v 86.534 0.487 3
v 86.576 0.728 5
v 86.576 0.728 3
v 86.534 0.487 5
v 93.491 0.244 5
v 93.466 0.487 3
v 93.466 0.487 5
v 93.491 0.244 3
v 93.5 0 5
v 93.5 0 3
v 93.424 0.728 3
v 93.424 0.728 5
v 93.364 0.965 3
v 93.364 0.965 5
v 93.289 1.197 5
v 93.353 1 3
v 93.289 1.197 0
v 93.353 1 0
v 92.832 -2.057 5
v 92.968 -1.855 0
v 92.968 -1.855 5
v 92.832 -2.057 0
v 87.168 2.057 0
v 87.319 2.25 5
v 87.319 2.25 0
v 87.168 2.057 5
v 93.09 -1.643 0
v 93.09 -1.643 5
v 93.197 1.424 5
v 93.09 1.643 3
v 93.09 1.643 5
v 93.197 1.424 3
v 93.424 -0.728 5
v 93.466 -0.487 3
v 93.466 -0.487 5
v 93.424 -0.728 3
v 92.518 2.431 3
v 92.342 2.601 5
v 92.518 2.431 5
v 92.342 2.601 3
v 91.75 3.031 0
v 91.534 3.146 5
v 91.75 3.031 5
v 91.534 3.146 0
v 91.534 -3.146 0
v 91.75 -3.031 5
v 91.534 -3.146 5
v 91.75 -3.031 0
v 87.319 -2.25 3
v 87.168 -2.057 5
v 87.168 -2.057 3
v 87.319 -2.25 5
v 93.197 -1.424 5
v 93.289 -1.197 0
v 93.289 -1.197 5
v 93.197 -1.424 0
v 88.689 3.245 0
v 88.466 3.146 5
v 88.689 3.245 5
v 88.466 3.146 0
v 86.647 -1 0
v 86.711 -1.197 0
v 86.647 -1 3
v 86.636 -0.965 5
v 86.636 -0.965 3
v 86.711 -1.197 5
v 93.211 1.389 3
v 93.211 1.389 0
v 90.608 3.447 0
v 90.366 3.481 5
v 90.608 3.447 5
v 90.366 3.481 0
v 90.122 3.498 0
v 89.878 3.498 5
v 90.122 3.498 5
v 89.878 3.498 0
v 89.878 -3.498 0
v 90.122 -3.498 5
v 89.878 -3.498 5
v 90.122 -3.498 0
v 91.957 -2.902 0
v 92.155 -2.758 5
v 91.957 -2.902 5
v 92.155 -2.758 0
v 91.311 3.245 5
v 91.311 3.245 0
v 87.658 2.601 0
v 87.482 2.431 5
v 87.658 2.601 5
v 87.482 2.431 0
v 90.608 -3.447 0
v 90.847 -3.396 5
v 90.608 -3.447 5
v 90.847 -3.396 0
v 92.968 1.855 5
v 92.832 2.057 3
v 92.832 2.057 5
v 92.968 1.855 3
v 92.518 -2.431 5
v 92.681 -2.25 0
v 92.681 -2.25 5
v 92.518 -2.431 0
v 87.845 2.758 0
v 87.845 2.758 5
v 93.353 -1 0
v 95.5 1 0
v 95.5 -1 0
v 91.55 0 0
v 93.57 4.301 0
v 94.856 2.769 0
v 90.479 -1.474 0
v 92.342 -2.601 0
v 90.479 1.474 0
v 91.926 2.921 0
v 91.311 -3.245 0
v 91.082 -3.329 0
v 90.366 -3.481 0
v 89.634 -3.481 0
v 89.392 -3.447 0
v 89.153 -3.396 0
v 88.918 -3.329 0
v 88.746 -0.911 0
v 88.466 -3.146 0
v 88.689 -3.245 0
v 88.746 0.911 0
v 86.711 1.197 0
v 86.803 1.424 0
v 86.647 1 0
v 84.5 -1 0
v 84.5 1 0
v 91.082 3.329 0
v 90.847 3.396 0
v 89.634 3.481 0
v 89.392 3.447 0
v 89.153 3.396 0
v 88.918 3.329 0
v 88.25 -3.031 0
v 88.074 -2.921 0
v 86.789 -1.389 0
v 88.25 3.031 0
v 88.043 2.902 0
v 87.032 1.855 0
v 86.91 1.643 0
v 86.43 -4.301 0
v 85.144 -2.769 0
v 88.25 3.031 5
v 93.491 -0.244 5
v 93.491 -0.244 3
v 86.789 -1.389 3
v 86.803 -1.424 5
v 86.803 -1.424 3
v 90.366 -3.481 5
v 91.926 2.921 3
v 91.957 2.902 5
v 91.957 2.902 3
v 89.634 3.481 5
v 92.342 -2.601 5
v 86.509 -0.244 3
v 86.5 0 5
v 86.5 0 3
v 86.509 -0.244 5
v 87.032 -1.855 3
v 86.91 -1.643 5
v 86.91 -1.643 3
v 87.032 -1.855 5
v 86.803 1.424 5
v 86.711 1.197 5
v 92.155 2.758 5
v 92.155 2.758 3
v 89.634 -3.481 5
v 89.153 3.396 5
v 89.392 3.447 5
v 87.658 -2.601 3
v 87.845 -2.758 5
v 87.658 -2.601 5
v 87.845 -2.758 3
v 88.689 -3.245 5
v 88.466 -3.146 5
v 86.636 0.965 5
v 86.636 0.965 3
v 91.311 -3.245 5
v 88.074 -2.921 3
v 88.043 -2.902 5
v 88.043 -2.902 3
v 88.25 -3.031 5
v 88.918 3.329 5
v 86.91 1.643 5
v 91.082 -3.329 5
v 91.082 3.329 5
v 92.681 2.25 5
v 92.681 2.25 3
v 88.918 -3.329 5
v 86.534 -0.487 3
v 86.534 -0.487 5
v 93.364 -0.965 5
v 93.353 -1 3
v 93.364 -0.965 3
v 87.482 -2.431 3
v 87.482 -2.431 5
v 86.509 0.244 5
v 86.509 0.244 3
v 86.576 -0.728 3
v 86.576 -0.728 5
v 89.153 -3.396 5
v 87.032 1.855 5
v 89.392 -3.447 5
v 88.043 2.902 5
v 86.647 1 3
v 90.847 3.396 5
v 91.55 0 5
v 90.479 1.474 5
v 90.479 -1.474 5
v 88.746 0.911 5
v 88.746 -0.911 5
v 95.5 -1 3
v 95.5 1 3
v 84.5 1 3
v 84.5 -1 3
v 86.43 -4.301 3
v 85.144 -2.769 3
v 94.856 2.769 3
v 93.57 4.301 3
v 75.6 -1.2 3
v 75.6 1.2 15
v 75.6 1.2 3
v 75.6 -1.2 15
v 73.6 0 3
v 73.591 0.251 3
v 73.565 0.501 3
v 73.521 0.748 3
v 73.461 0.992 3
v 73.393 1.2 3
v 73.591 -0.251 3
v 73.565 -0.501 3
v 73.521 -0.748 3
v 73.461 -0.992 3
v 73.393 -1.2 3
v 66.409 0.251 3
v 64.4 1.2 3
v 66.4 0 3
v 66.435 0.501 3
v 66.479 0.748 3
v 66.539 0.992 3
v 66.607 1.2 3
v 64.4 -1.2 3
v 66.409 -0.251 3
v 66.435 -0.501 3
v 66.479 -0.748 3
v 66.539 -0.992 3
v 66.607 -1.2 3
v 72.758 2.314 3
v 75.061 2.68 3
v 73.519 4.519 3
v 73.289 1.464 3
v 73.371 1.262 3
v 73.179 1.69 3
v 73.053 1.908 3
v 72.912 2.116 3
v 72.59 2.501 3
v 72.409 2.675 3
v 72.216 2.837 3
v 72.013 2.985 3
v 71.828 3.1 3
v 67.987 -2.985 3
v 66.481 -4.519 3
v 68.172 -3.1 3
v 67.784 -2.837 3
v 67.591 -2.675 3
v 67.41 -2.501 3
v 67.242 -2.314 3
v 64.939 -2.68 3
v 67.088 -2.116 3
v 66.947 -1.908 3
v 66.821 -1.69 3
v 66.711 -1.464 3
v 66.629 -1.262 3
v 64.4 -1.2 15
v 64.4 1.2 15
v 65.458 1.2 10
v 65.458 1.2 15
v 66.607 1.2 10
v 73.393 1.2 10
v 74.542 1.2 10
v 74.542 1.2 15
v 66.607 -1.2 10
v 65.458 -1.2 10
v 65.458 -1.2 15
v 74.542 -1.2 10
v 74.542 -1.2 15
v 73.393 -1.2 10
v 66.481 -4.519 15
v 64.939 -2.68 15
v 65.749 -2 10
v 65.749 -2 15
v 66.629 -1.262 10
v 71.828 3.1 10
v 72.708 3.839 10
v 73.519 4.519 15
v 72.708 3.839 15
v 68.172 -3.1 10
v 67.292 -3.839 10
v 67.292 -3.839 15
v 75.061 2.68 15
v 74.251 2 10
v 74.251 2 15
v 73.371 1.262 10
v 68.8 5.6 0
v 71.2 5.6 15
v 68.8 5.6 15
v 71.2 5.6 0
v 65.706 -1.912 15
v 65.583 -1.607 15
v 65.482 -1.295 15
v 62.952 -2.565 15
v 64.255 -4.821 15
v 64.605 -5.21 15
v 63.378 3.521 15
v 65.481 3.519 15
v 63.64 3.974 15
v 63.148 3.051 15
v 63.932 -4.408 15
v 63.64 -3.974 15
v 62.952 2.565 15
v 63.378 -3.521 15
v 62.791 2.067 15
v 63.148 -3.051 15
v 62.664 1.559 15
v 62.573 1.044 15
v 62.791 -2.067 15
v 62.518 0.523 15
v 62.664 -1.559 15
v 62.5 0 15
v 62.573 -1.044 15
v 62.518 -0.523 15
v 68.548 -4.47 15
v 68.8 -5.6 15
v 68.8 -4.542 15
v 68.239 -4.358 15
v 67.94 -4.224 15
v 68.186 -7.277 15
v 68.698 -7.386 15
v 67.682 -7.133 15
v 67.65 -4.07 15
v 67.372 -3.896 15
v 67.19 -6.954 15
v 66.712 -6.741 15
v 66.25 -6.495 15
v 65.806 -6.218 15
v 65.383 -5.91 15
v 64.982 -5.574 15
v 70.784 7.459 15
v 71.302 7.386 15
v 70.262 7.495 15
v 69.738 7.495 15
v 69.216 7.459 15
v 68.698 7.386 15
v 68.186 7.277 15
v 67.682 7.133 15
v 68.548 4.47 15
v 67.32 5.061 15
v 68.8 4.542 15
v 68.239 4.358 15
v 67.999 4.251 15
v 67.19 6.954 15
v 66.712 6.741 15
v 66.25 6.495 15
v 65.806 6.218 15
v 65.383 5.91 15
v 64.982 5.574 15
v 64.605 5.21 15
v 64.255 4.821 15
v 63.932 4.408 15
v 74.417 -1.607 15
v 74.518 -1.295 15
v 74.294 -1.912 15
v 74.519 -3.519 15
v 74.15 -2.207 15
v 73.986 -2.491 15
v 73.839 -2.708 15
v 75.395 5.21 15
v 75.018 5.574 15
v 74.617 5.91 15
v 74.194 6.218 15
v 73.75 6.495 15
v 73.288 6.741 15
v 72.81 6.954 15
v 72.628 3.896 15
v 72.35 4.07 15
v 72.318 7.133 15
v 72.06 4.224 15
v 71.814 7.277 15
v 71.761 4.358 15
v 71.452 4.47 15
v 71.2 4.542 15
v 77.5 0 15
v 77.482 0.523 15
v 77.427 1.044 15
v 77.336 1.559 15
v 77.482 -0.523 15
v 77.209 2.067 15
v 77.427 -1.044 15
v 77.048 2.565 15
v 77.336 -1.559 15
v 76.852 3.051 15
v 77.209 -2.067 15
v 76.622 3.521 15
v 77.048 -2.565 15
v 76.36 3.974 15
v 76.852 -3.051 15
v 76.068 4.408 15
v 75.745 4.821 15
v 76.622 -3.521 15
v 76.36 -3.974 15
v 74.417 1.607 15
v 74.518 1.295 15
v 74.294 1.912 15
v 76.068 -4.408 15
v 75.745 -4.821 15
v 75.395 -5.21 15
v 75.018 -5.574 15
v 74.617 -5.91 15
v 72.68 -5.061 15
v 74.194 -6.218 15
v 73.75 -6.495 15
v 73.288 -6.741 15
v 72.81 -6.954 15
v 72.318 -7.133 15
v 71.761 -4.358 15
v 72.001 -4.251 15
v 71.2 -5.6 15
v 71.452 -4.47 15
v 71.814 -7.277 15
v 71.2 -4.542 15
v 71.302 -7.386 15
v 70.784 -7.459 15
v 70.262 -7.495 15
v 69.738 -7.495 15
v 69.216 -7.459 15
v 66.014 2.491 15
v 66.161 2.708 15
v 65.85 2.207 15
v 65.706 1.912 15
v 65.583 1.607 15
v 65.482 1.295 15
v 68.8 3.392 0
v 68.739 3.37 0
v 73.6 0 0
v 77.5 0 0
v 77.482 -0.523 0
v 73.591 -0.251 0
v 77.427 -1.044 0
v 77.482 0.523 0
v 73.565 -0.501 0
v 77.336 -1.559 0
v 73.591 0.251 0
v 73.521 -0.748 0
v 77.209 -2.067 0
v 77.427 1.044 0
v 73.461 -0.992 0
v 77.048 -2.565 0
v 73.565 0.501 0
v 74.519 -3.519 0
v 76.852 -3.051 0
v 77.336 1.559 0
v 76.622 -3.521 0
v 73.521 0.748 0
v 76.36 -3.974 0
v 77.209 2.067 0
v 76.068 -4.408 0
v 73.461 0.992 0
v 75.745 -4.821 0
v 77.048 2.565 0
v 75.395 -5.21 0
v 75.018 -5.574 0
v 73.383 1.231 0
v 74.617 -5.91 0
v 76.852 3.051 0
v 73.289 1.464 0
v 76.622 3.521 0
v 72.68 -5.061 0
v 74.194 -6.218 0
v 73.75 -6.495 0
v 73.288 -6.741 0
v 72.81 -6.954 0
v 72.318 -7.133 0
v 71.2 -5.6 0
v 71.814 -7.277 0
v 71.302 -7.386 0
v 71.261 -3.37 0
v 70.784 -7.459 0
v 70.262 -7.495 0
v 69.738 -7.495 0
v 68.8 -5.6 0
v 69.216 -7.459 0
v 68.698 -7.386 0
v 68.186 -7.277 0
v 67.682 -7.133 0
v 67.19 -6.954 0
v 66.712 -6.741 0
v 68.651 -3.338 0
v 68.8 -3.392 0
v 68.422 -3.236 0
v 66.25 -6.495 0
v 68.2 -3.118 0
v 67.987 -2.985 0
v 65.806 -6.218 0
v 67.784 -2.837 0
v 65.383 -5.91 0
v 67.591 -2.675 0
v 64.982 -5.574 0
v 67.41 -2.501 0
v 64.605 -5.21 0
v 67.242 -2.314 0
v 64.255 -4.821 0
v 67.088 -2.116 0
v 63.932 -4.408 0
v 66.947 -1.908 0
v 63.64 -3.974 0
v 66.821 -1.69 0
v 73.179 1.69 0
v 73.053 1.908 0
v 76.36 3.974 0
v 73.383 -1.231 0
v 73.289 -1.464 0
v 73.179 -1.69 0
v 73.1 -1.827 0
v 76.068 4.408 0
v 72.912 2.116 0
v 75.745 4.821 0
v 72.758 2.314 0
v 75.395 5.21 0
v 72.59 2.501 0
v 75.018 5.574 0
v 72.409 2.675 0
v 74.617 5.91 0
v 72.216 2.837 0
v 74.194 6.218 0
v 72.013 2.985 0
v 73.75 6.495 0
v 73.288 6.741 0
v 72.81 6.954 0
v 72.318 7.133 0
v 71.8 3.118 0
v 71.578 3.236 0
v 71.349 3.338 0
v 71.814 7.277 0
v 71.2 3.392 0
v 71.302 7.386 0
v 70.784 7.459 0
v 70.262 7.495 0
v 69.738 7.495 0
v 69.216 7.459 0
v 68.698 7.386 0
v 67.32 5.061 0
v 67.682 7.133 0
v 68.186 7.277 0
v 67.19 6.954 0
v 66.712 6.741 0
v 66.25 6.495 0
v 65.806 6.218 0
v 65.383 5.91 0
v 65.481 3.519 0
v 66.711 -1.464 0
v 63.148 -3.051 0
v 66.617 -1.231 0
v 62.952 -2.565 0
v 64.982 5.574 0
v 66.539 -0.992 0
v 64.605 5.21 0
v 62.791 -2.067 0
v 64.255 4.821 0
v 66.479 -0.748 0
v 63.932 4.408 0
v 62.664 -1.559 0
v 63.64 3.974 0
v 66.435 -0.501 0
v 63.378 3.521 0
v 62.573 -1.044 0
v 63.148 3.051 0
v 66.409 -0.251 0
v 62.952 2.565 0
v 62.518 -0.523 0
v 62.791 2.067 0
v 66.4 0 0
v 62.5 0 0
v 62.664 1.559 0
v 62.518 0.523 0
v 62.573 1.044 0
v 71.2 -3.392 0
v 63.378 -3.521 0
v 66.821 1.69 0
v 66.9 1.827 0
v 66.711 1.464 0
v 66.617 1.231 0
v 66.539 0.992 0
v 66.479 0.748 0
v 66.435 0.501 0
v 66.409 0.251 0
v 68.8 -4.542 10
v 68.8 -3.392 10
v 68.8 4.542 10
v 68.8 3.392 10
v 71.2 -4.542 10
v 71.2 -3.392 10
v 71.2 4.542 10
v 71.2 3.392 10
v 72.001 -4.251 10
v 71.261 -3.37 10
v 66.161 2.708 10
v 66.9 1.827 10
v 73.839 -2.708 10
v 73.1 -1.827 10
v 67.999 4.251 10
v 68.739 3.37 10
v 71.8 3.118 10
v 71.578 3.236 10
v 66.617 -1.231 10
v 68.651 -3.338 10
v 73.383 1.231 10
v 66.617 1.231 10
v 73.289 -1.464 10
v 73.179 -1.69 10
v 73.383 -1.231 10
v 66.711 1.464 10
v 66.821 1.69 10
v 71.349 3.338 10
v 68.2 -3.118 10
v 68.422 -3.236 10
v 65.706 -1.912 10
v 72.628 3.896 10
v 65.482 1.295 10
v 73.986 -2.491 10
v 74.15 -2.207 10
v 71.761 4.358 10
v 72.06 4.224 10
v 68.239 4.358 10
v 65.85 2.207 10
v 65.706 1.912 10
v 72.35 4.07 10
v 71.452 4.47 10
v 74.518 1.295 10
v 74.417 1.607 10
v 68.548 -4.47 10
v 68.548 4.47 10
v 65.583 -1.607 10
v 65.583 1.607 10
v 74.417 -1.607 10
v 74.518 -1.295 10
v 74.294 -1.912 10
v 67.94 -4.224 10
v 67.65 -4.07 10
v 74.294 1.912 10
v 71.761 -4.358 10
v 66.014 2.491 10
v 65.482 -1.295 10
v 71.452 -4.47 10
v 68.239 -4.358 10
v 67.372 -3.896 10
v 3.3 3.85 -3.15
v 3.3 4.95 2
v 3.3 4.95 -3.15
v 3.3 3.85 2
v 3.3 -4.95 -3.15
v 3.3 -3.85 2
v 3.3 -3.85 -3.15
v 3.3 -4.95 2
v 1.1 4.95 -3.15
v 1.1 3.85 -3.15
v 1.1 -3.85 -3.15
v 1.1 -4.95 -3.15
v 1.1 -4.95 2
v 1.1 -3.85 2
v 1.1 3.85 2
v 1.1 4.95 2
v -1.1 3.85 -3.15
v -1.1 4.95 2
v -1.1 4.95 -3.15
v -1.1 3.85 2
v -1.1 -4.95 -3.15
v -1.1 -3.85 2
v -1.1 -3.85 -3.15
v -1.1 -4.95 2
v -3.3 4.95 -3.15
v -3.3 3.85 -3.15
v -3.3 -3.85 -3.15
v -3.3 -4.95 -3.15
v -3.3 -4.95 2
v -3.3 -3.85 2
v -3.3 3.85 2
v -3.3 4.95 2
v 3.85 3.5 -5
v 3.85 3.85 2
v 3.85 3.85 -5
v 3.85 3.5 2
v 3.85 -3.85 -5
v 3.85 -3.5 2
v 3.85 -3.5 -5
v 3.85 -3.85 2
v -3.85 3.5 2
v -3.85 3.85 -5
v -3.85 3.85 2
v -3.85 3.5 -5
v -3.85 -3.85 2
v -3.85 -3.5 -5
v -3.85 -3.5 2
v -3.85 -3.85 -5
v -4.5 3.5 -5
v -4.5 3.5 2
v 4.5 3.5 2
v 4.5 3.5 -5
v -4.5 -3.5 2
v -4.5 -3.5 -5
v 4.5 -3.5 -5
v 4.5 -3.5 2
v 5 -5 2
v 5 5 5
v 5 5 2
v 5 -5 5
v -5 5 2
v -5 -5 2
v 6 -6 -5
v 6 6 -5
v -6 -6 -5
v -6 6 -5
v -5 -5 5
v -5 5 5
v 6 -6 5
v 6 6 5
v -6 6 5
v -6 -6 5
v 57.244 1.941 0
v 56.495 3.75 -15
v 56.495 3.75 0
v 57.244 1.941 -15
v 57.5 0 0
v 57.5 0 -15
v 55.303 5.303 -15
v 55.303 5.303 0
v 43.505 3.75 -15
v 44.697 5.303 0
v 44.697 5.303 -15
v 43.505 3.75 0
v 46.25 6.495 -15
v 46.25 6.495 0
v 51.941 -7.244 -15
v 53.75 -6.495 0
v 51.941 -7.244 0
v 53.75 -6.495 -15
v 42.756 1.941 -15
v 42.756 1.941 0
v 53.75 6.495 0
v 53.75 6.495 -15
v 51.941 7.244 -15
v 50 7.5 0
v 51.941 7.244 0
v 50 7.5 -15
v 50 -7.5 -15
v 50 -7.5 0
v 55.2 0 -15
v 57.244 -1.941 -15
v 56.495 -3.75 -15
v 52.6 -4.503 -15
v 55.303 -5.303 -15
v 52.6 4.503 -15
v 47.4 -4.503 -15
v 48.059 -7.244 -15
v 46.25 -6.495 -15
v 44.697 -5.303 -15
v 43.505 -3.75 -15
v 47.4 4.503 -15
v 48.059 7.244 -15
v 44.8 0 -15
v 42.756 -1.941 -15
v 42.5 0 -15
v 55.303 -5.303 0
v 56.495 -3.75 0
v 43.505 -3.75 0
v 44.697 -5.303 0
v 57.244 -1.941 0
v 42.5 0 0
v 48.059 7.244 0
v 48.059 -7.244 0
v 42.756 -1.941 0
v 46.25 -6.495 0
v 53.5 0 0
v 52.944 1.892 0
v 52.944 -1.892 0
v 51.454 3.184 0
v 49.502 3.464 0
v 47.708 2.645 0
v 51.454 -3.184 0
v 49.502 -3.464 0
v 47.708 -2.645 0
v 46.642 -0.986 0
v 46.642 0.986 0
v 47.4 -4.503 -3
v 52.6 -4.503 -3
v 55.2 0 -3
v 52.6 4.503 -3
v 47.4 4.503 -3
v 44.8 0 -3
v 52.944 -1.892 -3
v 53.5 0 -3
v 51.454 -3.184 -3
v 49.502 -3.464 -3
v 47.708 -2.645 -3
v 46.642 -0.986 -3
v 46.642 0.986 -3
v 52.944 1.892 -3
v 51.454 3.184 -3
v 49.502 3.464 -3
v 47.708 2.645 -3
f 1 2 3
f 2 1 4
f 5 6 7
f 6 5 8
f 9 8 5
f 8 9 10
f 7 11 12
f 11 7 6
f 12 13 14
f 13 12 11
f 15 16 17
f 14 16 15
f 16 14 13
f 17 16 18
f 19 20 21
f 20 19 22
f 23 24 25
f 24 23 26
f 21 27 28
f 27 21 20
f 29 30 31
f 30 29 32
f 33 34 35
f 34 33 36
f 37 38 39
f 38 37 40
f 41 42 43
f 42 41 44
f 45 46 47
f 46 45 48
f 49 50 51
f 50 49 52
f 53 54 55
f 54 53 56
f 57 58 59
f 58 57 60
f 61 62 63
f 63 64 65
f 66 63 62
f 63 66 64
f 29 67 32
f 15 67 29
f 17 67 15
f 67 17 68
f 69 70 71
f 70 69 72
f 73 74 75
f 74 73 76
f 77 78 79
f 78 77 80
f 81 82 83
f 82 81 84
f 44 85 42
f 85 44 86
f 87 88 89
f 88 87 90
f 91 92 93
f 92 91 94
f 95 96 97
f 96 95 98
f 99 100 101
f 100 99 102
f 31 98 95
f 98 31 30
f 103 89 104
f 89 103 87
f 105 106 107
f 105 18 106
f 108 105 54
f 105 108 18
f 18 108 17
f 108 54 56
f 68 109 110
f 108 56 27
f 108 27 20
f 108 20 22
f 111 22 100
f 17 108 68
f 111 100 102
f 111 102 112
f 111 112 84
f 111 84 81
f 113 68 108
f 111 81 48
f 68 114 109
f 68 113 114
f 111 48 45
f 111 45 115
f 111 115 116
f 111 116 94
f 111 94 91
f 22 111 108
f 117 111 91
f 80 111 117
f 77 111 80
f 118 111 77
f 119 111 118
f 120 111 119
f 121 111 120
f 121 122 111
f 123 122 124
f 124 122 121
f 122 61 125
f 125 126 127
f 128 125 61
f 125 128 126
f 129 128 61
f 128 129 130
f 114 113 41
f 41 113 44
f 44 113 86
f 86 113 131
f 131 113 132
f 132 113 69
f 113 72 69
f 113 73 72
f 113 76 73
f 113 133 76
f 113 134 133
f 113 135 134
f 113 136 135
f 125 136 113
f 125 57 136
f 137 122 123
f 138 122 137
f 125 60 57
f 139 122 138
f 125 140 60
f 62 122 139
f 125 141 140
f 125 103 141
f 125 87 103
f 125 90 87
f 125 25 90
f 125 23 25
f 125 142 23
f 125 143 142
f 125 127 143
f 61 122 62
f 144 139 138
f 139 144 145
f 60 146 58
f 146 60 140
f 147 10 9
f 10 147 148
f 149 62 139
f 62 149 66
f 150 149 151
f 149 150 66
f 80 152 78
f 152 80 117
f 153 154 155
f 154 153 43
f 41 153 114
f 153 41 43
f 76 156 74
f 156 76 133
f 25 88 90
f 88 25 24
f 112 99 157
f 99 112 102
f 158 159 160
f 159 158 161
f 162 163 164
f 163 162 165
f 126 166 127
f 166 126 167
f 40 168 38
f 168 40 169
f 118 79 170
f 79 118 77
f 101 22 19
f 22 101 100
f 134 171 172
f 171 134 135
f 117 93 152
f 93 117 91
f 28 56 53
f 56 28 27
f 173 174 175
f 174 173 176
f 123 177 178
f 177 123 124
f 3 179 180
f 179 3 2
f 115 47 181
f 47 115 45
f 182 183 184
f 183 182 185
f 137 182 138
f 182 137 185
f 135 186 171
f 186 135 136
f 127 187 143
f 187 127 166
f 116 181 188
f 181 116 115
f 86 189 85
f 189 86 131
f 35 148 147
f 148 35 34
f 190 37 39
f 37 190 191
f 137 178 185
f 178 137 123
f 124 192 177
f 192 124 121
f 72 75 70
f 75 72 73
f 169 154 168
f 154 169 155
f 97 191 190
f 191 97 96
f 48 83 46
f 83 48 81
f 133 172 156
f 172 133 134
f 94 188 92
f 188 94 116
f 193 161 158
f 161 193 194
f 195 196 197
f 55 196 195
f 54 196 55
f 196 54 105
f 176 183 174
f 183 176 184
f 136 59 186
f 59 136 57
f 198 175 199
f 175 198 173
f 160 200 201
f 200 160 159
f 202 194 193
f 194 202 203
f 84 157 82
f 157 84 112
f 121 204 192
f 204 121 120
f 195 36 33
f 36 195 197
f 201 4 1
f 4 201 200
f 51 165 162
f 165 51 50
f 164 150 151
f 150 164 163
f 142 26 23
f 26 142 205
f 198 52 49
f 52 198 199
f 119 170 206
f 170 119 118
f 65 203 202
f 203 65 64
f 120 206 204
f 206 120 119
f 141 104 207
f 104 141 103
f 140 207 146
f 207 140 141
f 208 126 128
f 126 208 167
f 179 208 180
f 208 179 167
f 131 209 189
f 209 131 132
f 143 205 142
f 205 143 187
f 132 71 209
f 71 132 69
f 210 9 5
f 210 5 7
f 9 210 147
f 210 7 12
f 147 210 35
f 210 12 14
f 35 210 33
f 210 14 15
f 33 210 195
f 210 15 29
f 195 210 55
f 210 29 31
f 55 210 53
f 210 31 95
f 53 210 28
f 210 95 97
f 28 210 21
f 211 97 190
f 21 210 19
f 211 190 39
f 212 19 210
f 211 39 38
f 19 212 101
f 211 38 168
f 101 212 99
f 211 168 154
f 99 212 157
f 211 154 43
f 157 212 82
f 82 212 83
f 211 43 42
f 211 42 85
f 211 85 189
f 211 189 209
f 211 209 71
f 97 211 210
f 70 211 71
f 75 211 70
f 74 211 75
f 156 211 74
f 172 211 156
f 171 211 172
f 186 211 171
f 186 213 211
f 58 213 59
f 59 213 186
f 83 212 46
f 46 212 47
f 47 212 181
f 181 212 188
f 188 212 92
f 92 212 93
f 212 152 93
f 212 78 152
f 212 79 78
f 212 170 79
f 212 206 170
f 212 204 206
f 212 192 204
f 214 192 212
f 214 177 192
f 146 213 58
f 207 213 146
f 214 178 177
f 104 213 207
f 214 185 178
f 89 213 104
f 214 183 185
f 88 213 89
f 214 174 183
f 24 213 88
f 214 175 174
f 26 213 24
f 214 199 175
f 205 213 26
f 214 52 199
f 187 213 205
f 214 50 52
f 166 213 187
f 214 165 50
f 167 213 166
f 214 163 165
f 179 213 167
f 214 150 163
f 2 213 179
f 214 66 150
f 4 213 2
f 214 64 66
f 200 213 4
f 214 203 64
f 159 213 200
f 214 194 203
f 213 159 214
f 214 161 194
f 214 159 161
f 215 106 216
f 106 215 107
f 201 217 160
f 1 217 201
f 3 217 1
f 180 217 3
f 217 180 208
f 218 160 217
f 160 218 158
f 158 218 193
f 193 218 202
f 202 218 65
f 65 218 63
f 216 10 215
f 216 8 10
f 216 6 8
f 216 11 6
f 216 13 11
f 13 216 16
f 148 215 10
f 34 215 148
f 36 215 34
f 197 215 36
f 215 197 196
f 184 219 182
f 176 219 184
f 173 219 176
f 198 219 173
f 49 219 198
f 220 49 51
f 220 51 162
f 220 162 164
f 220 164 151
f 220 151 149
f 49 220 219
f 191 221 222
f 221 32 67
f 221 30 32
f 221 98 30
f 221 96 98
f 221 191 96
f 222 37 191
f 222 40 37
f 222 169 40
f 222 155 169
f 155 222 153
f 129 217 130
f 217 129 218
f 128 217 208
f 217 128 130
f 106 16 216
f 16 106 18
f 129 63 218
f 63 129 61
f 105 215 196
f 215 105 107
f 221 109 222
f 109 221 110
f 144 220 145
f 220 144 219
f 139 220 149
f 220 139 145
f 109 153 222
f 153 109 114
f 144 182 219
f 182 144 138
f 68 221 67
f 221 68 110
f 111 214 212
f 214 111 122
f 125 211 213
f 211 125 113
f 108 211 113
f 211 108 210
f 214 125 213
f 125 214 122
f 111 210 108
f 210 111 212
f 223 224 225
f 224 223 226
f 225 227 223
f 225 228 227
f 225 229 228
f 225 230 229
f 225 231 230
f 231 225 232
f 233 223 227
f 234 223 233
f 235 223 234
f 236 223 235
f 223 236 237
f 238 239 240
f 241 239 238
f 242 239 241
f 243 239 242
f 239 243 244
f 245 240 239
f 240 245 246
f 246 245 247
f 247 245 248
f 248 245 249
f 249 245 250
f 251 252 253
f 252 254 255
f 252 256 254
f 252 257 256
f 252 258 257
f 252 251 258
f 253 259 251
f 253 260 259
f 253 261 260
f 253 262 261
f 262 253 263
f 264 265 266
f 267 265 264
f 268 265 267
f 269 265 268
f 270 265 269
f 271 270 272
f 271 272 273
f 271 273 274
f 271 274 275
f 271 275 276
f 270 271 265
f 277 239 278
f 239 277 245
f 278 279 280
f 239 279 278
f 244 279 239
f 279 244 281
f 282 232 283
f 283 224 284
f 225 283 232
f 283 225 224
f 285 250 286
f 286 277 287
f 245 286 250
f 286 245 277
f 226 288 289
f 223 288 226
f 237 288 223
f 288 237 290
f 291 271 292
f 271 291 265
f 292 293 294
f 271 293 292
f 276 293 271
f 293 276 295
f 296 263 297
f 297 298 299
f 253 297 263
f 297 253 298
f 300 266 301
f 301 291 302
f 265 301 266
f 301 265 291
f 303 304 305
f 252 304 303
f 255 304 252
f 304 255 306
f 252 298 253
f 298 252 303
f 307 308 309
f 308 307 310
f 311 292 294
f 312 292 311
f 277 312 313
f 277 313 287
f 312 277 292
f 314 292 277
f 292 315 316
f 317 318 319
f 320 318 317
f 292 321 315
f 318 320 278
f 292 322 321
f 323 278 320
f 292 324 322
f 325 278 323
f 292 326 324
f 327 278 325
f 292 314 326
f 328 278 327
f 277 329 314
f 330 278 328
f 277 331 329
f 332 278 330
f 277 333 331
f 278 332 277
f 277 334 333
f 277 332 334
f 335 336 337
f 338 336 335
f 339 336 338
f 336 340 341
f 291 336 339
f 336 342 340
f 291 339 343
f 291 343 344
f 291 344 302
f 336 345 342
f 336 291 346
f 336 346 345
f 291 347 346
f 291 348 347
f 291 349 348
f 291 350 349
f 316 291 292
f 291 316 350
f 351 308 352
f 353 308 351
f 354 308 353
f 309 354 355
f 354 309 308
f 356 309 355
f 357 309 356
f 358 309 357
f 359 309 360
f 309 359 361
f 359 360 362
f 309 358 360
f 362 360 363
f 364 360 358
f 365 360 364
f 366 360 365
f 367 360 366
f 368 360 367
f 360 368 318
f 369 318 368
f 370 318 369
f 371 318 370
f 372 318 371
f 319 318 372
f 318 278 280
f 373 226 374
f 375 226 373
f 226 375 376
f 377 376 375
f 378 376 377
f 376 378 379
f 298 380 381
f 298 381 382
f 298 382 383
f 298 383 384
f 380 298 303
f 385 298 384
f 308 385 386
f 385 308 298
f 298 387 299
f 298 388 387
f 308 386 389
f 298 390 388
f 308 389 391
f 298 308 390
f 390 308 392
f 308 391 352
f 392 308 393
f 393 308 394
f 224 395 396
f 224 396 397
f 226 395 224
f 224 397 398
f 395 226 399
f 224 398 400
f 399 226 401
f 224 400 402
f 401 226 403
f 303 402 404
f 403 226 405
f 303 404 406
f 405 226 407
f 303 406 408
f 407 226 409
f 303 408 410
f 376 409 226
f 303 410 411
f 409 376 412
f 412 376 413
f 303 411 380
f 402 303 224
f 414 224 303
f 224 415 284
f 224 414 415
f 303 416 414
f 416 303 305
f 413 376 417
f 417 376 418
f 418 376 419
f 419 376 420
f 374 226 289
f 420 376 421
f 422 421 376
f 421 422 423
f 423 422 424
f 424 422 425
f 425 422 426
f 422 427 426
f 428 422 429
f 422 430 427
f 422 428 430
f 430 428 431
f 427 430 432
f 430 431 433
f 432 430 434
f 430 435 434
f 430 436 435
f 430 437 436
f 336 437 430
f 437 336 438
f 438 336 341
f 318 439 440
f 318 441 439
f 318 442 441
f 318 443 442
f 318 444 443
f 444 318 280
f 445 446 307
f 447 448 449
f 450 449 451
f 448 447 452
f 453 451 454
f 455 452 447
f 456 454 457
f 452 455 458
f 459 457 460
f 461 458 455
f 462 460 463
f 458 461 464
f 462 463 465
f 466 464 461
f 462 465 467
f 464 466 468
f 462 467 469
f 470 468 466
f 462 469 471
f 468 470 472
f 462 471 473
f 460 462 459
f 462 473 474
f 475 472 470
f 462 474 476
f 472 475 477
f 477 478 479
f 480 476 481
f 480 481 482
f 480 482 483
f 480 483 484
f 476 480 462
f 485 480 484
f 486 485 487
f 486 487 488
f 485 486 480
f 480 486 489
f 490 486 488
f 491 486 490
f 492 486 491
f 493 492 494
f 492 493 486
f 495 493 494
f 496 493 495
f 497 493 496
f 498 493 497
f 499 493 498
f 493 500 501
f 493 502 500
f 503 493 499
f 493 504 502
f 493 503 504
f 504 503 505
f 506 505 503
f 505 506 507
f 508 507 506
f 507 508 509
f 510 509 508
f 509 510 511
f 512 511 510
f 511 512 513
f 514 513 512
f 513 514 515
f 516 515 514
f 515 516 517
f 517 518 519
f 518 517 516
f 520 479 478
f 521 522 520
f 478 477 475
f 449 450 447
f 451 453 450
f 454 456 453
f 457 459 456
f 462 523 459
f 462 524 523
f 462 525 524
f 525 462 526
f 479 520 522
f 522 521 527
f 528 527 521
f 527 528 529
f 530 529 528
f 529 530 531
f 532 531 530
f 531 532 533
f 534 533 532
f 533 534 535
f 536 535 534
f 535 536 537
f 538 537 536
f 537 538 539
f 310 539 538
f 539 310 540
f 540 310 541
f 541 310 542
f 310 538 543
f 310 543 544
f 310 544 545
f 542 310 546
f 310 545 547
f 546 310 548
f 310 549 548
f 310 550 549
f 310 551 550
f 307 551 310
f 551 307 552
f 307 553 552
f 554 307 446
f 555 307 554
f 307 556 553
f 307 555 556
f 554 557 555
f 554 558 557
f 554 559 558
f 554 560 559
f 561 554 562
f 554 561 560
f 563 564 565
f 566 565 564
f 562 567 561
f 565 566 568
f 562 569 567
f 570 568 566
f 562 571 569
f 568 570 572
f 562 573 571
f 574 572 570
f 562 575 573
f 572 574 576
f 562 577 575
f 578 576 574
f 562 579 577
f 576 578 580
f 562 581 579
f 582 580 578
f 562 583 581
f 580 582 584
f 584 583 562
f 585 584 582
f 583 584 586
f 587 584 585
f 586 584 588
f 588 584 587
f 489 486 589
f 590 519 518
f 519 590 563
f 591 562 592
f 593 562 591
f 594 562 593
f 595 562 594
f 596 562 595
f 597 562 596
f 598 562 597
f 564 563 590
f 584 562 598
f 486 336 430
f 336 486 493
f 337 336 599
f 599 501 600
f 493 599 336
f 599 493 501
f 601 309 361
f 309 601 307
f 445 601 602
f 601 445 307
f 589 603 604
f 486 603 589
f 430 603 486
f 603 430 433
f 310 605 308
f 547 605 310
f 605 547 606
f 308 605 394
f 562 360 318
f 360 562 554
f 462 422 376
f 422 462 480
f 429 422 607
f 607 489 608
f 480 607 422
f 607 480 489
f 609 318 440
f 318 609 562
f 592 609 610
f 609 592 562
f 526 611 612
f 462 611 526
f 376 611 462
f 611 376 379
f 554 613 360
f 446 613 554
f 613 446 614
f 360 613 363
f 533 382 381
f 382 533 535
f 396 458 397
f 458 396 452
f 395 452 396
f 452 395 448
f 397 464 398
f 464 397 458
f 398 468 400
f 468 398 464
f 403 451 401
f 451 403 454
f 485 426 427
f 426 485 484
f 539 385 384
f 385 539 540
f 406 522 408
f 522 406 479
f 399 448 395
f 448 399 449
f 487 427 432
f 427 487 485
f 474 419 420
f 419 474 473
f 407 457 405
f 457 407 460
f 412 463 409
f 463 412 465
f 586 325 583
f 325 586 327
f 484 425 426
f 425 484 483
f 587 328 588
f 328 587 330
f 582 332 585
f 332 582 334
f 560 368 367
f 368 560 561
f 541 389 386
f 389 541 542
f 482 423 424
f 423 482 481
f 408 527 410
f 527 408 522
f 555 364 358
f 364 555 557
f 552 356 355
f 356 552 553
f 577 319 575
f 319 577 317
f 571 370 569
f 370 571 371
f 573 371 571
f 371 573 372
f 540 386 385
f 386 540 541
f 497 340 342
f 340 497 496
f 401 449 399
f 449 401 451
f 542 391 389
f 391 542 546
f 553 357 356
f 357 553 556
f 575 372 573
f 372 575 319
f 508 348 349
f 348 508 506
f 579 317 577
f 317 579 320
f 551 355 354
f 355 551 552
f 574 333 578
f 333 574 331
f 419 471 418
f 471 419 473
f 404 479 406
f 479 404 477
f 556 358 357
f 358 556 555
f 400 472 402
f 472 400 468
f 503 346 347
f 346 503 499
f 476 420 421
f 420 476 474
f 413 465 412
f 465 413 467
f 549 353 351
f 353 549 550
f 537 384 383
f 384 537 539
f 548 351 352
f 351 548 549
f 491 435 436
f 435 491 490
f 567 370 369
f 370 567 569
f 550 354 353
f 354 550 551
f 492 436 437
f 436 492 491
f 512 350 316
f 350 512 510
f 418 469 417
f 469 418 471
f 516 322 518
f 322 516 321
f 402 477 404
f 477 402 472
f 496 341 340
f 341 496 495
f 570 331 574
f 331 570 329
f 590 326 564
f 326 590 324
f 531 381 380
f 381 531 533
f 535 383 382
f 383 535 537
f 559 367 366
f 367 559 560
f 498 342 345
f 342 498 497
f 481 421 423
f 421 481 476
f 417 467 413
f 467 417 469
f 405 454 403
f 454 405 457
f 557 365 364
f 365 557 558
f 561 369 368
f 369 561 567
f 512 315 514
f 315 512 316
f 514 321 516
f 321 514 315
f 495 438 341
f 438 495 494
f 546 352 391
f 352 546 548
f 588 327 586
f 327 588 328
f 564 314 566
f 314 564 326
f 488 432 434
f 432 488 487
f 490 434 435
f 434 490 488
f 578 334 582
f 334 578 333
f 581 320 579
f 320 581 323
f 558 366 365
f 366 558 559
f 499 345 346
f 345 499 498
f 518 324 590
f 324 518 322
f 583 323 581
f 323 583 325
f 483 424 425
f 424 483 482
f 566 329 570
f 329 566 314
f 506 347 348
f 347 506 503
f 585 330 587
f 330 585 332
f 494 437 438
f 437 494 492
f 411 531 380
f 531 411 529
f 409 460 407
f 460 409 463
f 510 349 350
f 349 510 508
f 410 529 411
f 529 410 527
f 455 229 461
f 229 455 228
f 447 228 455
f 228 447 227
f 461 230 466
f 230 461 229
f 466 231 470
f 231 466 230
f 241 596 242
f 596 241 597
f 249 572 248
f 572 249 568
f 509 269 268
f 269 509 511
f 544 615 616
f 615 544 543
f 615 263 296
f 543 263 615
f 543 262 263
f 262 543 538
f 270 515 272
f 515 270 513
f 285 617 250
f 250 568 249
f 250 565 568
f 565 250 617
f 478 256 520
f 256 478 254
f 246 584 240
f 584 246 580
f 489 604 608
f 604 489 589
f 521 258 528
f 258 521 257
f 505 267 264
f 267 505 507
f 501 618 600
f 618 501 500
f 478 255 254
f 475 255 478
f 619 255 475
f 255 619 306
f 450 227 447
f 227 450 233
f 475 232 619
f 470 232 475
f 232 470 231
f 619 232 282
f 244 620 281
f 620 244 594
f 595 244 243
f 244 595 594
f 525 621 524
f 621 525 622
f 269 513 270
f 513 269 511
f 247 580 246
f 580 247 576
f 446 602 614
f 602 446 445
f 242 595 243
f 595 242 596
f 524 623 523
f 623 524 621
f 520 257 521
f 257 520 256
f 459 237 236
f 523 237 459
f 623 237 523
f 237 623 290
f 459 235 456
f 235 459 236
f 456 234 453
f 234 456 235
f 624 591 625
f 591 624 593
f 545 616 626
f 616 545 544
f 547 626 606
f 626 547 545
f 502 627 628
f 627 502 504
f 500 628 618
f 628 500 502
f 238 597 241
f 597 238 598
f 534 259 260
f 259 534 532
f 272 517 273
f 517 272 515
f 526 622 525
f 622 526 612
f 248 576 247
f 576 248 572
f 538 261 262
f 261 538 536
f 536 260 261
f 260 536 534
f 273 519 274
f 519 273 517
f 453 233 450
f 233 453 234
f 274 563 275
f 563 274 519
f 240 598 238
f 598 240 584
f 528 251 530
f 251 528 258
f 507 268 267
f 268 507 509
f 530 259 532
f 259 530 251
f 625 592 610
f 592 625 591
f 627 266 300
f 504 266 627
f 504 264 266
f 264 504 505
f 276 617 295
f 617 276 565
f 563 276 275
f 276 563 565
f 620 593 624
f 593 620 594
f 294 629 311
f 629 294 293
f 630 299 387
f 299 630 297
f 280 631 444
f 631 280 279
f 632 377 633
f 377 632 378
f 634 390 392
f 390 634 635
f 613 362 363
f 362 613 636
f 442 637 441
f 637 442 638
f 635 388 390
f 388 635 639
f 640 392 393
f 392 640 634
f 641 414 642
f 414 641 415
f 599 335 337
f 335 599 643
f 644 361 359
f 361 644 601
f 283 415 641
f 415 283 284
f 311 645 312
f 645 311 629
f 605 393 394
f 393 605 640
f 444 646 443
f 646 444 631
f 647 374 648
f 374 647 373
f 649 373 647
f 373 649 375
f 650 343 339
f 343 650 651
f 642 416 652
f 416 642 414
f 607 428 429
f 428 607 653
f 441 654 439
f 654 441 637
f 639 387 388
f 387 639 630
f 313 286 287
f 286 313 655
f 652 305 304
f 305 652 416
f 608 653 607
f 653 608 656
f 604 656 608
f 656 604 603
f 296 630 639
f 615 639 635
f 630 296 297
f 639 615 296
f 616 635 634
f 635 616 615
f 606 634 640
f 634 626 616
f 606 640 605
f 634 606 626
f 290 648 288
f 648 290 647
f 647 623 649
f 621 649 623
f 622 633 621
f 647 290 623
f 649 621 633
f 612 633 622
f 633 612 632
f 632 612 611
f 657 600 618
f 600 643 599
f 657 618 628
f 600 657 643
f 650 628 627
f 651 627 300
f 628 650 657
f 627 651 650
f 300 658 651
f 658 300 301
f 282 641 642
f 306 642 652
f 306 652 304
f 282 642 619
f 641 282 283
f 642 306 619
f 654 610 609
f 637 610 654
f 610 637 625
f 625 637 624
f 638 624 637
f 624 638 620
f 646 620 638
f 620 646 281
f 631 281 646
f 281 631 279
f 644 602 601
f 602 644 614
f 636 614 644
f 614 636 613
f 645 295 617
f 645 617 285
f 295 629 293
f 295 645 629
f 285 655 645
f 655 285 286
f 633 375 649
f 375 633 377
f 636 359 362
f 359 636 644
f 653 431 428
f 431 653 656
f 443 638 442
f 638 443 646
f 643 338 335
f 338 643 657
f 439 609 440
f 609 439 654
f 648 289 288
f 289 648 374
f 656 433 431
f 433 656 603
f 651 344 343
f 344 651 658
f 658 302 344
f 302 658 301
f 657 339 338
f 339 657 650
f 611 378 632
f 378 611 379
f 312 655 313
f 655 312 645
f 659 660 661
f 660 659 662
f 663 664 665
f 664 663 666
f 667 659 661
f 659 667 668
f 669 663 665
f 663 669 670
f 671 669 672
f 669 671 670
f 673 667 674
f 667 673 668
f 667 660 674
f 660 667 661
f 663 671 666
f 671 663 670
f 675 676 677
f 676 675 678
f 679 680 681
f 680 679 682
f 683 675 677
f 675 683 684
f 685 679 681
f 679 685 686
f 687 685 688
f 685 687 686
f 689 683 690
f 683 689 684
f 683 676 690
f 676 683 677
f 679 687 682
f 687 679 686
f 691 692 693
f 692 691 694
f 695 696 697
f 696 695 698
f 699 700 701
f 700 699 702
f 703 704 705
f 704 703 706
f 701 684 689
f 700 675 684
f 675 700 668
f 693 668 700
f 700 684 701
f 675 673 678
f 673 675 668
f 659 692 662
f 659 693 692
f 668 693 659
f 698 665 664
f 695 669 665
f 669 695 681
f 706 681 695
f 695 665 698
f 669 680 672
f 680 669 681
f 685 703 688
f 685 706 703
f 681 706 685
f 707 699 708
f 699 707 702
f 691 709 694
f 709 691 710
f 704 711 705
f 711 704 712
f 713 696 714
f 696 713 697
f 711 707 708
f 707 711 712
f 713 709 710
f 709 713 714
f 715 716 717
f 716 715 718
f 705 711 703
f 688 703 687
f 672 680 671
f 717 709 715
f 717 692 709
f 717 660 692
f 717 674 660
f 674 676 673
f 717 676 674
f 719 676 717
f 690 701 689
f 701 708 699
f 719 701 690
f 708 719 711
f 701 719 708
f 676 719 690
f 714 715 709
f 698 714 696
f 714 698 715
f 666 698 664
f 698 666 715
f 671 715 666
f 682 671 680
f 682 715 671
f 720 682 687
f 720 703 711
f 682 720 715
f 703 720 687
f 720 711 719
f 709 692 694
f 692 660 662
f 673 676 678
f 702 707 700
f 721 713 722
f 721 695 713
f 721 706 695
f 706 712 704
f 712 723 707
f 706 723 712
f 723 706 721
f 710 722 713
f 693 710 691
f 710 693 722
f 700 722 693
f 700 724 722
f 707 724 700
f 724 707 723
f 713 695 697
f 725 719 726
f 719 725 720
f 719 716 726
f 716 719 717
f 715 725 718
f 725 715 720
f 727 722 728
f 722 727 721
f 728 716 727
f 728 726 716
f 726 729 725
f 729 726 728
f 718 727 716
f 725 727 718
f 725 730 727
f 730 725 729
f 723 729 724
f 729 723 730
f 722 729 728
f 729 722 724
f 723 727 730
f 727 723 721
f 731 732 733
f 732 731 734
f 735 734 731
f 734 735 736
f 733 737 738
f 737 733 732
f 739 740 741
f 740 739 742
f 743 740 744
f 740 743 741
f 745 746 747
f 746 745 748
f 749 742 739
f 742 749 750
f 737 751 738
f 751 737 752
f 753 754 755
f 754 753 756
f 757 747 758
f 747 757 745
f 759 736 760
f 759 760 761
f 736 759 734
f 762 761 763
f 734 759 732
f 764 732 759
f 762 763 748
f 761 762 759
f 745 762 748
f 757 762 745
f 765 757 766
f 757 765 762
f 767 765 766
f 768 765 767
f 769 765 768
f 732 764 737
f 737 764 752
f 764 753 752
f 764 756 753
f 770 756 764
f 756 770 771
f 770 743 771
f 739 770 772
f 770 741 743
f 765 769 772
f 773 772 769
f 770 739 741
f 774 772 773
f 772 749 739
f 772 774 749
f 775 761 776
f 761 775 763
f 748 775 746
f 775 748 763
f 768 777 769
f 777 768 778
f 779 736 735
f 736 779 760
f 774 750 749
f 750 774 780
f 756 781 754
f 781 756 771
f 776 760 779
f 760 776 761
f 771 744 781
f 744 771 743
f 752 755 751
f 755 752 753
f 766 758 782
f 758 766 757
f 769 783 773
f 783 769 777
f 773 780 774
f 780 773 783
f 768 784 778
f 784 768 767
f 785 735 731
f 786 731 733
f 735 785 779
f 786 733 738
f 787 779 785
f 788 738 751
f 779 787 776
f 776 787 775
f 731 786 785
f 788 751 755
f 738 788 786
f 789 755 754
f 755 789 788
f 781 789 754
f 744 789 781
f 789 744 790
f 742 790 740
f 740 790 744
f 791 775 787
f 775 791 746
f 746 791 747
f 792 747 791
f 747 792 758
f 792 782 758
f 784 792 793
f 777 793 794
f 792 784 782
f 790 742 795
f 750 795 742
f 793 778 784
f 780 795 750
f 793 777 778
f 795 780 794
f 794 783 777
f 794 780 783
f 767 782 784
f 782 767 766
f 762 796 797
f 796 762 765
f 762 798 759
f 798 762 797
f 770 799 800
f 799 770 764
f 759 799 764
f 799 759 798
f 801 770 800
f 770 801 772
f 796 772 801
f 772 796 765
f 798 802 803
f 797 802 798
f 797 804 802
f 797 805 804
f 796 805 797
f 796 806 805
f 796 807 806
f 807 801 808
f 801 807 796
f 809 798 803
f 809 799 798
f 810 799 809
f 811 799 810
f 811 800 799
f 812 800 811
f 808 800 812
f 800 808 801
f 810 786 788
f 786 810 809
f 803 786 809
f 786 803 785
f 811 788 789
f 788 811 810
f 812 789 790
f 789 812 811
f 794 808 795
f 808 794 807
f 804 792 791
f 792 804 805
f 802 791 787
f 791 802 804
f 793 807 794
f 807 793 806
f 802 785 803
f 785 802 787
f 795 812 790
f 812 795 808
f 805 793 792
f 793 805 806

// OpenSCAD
/* Experimental probe configuration for lift. Current hope is for a cherrymx switch, could probably work with a reed switch. */

// hole for probe - 7mm 

// square probe:
// lip: 1.5mm
//

angle=40;
module probe2(shadow=true)
{
  difference()
  {
    cylinder(d=15, h=15);
    translate([0,0,3])cylinder(d=10.4, h=20, $fn=6);
    cylinder(d=7, h=20);
  }
 
}

translate([70,0,0])
{
  translate([20,0,0])difference()
  {
    union() {
      cylinder(d=7, h=5, $fn=90);
      translate([0,0,3/2])cube([11,2,3], center=true);
      rotate([0,0,angle])translate([0,0,3/2])cube([11,2,3], center=true);
    }
    cylinder(d=3.1, h=5);
  }
  difference() {
    cylinder(d=15, h=15, $fn=90);
    translate([0,0,3])
    {
      translate([0,0,15/2])cube([11.2,2.4,15], center=true);
      rotate([0,0,angle])translate([0,0,15/2])cube([11.2,2.4,15], center=true);
    }
    rotate([0,0,90])
    translate([0,0,0])
    {
      translate([0,0,15/2])cube([11.2,2.4,15], center=true);
      rotate([0,0,angle])translate([0,0,15/2])cube([11.2,2.4,15], center=true);
    }
    cylinder(d=7.2, h=20, $fn=90);
    #translate([0,0,10])
      cylinder(d=9.4,2, h=20, $fn=90);
  }
}

module probe(shadow = true, key=[2,9,3], pos = [0])
{
    difference() {
        union() {
            cube([7,7,7], center=true);
            for (i = pos)
            {
                translate([i*key[0],0,2])cube(key, center=true);
            }
        }
        if (!shadow)
            cylinder(d=5, h=10, center=true);
    }
}
translate([0,0,-1.5])difference(){
cube([10,10,7], center=true);
scale([1.1,1.1,1.1])probe(true, [2,9,7], pos=[1,-1]);
rotate([0,0,90])probe(true, [7,9,12], pos=[0]);
}

difference(){
cube([12,12,10], center=true);
cube([10,10,10], center=true);
}

translate([50,0,0])mirror([0,0,1])probe2(false, [2,9,3], pos=[1,-1]);
